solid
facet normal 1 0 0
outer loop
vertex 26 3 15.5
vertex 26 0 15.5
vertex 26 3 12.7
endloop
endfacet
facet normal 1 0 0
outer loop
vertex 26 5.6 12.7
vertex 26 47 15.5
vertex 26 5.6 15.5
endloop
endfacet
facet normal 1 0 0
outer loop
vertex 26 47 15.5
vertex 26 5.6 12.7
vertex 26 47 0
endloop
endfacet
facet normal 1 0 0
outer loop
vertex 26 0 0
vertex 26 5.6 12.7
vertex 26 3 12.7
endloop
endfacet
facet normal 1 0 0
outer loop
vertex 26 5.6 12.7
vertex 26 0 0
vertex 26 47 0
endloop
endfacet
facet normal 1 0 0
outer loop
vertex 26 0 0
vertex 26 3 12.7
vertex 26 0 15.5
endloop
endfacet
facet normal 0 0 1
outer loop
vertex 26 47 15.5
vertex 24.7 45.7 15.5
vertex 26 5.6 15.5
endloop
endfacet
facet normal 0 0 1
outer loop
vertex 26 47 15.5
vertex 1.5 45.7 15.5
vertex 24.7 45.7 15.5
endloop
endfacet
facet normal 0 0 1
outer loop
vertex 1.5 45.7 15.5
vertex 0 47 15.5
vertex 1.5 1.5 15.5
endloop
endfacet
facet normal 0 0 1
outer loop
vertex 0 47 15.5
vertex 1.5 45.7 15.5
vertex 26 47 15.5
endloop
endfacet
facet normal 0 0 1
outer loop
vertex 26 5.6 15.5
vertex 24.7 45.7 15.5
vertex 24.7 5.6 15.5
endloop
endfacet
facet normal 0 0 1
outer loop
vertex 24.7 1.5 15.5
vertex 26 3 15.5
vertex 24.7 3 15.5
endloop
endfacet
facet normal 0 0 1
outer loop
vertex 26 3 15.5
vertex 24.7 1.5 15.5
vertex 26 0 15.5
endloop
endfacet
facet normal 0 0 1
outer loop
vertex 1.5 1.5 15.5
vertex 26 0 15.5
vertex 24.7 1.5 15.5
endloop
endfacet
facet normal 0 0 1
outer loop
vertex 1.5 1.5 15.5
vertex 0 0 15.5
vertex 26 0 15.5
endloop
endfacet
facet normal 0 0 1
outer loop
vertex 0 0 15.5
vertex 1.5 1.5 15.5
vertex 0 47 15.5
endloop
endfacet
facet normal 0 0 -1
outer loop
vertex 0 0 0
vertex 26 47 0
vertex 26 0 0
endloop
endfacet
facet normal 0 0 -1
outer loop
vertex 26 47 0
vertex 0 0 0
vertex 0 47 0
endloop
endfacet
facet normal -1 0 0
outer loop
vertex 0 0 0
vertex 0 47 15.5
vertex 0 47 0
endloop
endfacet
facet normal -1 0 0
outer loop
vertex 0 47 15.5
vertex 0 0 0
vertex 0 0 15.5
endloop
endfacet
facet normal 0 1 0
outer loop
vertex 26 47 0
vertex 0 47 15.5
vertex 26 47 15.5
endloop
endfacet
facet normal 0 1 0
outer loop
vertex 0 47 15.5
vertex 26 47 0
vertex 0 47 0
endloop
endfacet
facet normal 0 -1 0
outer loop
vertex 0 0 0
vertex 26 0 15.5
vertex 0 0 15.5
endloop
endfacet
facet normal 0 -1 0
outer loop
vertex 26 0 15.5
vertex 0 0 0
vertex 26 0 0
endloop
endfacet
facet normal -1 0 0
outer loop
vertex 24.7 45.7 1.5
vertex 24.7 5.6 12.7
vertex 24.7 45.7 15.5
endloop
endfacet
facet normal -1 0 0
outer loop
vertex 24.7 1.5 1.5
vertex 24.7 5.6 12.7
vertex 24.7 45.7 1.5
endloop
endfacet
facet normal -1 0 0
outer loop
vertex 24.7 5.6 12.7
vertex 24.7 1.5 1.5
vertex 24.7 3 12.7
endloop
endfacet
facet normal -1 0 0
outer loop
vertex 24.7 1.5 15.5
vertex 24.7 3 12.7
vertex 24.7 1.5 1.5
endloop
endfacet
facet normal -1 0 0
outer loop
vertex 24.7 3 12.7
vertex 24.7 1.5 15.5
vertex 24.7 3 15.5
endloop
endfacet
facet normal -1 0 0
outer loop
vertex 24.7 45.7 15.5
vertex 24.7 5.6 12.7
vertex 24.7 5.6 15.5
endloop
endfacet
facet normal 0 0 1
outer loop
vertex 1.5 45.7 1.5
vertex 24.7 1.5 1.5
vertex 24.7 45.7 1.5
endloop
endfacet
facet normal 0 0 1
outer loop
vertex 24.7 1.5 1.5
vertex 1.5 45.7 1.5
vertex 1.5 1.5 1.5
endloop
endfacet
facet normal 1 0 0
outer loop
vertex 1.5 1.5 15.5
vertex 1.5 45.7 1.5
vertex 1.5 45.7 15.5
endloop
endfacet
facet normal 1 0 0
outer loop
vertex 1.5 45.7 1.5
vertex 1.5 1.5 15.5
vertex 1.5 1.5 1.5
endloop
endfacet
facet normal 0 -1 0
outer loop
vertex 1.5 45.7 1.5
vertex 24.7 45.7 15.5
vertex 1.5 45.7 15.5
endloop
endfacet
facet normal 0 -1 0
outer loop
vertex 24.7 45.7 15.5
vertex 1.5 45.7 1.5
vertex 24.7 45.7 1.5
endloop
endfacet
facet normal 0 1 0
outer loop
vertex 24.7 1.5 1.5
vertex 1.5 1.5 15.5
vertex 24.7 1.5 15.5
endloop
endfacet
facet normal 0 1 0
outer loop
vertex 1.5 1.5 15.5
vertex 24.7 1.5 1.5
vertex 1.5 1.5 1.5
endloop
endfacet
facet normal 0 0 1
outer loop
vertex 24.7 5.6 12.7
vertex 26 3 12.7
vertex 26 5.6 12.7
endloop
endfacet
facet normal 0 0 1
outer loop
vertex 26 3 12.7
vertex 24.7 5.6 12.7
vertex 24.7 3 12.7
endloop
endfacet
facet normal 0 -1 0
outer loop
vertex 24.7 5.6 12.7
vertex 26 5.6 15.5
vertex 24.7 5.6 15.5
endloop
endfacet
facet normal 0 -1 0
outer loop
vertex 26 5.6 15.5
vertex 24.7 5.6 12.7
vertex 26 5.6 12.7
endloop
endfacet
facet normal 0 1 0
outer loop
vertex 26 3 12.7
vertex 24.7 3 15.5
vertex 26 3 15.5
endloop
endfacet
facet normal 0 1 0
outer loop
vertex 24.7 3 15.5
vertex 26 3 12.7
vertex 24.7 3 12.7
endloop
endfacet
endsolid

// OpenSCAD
// file: parts/moteino.scad
echo(version=version());

// Values are in millimeters

$fa=1;
$fs=1;
////////////////////////////

function moteino_dims(has_ftdi_pins=true, has_headers = "top") = [
	(23),
	(34 + (has_ftdi_pins?10:0)),
	(2.5 + ((has_headers)?10:0))
	];
	


module moteino(has_ftdi_pins=true, has_headers = "top") {
	motenio = [23, 34, 2.5];
	cube(motenio);

	if(has_ftdi_pins) {
		translate([4, -10, motenio[2]]) {
			cube([15, 12, 3]);
		}
	}
	header = [3, motenio[1], 10];
	if(has_headers == "top") {
		translate([0, 0, motenio[2]]) cube(header);
		translate([(motenio[0] - header[0]), 0, motenio[2]]) cube(header);
	} else if (has_headers == "bot" || has_headers == "bottom") {
		translate([0, 0, -header[2]]) cube(header);
		translate([(motenio[0] - header[0]), 0, -header[2]]) cube(header);
	}
}


moteino();

// vim: set ai sw=2 ts=2 :
// main file
echo(version=version());

// Values are in millimeters

$fa=1;
$fs=1;
////////////////////////////
use <parts/moteino.scad>;

tolerance=0.2;
wall_thickness = 1.5;


// Main Box
mote_box=moteino_dims() + [
	wall_thickness*2,
	wall_thickness*2,
	wall_thickness*2
];
mote_cut=moteino_dims() + [
	tolerance,
	tolerance,
	tolerance + wall_thickness,
];
wire_diameter=1.3; // Battery wires

%translate([wall_thickness+tolerance,10+wall_thickness,wall_thickness+tolerance])
	moteino();

!difference() {
	cube(mote_box);
	translate([wall_thickness,wall_thickness,wall_thickness]) cube(mote_cut);
	// Cut slot for battery wires coming in.
	translate([mote_box[0]-0.5 - wall_thickness, 3, mote_box[2]-(wire_diameter+wall_thickness)])
		cube([wall_thickness+1, wire_diameter*2, wire_diameter+wall_thickness+0.1]);
}

// Lid
mote_lid=[
	mote_box[0],
	mote_box[1],
	wall_thickness
];
mote_lid_lip = [
	mote_box[0] - wall_thickness*2,
	mote_box[1] - wall_thickness*2,
	wall_thickness
];
translate([0,0,mote_box[2] + 20])
union() {
	cube(mote_lid);
	translate([wall_thickness,wall_thickness,-wall_thickness]) cube(mote_lid_lip);
}
